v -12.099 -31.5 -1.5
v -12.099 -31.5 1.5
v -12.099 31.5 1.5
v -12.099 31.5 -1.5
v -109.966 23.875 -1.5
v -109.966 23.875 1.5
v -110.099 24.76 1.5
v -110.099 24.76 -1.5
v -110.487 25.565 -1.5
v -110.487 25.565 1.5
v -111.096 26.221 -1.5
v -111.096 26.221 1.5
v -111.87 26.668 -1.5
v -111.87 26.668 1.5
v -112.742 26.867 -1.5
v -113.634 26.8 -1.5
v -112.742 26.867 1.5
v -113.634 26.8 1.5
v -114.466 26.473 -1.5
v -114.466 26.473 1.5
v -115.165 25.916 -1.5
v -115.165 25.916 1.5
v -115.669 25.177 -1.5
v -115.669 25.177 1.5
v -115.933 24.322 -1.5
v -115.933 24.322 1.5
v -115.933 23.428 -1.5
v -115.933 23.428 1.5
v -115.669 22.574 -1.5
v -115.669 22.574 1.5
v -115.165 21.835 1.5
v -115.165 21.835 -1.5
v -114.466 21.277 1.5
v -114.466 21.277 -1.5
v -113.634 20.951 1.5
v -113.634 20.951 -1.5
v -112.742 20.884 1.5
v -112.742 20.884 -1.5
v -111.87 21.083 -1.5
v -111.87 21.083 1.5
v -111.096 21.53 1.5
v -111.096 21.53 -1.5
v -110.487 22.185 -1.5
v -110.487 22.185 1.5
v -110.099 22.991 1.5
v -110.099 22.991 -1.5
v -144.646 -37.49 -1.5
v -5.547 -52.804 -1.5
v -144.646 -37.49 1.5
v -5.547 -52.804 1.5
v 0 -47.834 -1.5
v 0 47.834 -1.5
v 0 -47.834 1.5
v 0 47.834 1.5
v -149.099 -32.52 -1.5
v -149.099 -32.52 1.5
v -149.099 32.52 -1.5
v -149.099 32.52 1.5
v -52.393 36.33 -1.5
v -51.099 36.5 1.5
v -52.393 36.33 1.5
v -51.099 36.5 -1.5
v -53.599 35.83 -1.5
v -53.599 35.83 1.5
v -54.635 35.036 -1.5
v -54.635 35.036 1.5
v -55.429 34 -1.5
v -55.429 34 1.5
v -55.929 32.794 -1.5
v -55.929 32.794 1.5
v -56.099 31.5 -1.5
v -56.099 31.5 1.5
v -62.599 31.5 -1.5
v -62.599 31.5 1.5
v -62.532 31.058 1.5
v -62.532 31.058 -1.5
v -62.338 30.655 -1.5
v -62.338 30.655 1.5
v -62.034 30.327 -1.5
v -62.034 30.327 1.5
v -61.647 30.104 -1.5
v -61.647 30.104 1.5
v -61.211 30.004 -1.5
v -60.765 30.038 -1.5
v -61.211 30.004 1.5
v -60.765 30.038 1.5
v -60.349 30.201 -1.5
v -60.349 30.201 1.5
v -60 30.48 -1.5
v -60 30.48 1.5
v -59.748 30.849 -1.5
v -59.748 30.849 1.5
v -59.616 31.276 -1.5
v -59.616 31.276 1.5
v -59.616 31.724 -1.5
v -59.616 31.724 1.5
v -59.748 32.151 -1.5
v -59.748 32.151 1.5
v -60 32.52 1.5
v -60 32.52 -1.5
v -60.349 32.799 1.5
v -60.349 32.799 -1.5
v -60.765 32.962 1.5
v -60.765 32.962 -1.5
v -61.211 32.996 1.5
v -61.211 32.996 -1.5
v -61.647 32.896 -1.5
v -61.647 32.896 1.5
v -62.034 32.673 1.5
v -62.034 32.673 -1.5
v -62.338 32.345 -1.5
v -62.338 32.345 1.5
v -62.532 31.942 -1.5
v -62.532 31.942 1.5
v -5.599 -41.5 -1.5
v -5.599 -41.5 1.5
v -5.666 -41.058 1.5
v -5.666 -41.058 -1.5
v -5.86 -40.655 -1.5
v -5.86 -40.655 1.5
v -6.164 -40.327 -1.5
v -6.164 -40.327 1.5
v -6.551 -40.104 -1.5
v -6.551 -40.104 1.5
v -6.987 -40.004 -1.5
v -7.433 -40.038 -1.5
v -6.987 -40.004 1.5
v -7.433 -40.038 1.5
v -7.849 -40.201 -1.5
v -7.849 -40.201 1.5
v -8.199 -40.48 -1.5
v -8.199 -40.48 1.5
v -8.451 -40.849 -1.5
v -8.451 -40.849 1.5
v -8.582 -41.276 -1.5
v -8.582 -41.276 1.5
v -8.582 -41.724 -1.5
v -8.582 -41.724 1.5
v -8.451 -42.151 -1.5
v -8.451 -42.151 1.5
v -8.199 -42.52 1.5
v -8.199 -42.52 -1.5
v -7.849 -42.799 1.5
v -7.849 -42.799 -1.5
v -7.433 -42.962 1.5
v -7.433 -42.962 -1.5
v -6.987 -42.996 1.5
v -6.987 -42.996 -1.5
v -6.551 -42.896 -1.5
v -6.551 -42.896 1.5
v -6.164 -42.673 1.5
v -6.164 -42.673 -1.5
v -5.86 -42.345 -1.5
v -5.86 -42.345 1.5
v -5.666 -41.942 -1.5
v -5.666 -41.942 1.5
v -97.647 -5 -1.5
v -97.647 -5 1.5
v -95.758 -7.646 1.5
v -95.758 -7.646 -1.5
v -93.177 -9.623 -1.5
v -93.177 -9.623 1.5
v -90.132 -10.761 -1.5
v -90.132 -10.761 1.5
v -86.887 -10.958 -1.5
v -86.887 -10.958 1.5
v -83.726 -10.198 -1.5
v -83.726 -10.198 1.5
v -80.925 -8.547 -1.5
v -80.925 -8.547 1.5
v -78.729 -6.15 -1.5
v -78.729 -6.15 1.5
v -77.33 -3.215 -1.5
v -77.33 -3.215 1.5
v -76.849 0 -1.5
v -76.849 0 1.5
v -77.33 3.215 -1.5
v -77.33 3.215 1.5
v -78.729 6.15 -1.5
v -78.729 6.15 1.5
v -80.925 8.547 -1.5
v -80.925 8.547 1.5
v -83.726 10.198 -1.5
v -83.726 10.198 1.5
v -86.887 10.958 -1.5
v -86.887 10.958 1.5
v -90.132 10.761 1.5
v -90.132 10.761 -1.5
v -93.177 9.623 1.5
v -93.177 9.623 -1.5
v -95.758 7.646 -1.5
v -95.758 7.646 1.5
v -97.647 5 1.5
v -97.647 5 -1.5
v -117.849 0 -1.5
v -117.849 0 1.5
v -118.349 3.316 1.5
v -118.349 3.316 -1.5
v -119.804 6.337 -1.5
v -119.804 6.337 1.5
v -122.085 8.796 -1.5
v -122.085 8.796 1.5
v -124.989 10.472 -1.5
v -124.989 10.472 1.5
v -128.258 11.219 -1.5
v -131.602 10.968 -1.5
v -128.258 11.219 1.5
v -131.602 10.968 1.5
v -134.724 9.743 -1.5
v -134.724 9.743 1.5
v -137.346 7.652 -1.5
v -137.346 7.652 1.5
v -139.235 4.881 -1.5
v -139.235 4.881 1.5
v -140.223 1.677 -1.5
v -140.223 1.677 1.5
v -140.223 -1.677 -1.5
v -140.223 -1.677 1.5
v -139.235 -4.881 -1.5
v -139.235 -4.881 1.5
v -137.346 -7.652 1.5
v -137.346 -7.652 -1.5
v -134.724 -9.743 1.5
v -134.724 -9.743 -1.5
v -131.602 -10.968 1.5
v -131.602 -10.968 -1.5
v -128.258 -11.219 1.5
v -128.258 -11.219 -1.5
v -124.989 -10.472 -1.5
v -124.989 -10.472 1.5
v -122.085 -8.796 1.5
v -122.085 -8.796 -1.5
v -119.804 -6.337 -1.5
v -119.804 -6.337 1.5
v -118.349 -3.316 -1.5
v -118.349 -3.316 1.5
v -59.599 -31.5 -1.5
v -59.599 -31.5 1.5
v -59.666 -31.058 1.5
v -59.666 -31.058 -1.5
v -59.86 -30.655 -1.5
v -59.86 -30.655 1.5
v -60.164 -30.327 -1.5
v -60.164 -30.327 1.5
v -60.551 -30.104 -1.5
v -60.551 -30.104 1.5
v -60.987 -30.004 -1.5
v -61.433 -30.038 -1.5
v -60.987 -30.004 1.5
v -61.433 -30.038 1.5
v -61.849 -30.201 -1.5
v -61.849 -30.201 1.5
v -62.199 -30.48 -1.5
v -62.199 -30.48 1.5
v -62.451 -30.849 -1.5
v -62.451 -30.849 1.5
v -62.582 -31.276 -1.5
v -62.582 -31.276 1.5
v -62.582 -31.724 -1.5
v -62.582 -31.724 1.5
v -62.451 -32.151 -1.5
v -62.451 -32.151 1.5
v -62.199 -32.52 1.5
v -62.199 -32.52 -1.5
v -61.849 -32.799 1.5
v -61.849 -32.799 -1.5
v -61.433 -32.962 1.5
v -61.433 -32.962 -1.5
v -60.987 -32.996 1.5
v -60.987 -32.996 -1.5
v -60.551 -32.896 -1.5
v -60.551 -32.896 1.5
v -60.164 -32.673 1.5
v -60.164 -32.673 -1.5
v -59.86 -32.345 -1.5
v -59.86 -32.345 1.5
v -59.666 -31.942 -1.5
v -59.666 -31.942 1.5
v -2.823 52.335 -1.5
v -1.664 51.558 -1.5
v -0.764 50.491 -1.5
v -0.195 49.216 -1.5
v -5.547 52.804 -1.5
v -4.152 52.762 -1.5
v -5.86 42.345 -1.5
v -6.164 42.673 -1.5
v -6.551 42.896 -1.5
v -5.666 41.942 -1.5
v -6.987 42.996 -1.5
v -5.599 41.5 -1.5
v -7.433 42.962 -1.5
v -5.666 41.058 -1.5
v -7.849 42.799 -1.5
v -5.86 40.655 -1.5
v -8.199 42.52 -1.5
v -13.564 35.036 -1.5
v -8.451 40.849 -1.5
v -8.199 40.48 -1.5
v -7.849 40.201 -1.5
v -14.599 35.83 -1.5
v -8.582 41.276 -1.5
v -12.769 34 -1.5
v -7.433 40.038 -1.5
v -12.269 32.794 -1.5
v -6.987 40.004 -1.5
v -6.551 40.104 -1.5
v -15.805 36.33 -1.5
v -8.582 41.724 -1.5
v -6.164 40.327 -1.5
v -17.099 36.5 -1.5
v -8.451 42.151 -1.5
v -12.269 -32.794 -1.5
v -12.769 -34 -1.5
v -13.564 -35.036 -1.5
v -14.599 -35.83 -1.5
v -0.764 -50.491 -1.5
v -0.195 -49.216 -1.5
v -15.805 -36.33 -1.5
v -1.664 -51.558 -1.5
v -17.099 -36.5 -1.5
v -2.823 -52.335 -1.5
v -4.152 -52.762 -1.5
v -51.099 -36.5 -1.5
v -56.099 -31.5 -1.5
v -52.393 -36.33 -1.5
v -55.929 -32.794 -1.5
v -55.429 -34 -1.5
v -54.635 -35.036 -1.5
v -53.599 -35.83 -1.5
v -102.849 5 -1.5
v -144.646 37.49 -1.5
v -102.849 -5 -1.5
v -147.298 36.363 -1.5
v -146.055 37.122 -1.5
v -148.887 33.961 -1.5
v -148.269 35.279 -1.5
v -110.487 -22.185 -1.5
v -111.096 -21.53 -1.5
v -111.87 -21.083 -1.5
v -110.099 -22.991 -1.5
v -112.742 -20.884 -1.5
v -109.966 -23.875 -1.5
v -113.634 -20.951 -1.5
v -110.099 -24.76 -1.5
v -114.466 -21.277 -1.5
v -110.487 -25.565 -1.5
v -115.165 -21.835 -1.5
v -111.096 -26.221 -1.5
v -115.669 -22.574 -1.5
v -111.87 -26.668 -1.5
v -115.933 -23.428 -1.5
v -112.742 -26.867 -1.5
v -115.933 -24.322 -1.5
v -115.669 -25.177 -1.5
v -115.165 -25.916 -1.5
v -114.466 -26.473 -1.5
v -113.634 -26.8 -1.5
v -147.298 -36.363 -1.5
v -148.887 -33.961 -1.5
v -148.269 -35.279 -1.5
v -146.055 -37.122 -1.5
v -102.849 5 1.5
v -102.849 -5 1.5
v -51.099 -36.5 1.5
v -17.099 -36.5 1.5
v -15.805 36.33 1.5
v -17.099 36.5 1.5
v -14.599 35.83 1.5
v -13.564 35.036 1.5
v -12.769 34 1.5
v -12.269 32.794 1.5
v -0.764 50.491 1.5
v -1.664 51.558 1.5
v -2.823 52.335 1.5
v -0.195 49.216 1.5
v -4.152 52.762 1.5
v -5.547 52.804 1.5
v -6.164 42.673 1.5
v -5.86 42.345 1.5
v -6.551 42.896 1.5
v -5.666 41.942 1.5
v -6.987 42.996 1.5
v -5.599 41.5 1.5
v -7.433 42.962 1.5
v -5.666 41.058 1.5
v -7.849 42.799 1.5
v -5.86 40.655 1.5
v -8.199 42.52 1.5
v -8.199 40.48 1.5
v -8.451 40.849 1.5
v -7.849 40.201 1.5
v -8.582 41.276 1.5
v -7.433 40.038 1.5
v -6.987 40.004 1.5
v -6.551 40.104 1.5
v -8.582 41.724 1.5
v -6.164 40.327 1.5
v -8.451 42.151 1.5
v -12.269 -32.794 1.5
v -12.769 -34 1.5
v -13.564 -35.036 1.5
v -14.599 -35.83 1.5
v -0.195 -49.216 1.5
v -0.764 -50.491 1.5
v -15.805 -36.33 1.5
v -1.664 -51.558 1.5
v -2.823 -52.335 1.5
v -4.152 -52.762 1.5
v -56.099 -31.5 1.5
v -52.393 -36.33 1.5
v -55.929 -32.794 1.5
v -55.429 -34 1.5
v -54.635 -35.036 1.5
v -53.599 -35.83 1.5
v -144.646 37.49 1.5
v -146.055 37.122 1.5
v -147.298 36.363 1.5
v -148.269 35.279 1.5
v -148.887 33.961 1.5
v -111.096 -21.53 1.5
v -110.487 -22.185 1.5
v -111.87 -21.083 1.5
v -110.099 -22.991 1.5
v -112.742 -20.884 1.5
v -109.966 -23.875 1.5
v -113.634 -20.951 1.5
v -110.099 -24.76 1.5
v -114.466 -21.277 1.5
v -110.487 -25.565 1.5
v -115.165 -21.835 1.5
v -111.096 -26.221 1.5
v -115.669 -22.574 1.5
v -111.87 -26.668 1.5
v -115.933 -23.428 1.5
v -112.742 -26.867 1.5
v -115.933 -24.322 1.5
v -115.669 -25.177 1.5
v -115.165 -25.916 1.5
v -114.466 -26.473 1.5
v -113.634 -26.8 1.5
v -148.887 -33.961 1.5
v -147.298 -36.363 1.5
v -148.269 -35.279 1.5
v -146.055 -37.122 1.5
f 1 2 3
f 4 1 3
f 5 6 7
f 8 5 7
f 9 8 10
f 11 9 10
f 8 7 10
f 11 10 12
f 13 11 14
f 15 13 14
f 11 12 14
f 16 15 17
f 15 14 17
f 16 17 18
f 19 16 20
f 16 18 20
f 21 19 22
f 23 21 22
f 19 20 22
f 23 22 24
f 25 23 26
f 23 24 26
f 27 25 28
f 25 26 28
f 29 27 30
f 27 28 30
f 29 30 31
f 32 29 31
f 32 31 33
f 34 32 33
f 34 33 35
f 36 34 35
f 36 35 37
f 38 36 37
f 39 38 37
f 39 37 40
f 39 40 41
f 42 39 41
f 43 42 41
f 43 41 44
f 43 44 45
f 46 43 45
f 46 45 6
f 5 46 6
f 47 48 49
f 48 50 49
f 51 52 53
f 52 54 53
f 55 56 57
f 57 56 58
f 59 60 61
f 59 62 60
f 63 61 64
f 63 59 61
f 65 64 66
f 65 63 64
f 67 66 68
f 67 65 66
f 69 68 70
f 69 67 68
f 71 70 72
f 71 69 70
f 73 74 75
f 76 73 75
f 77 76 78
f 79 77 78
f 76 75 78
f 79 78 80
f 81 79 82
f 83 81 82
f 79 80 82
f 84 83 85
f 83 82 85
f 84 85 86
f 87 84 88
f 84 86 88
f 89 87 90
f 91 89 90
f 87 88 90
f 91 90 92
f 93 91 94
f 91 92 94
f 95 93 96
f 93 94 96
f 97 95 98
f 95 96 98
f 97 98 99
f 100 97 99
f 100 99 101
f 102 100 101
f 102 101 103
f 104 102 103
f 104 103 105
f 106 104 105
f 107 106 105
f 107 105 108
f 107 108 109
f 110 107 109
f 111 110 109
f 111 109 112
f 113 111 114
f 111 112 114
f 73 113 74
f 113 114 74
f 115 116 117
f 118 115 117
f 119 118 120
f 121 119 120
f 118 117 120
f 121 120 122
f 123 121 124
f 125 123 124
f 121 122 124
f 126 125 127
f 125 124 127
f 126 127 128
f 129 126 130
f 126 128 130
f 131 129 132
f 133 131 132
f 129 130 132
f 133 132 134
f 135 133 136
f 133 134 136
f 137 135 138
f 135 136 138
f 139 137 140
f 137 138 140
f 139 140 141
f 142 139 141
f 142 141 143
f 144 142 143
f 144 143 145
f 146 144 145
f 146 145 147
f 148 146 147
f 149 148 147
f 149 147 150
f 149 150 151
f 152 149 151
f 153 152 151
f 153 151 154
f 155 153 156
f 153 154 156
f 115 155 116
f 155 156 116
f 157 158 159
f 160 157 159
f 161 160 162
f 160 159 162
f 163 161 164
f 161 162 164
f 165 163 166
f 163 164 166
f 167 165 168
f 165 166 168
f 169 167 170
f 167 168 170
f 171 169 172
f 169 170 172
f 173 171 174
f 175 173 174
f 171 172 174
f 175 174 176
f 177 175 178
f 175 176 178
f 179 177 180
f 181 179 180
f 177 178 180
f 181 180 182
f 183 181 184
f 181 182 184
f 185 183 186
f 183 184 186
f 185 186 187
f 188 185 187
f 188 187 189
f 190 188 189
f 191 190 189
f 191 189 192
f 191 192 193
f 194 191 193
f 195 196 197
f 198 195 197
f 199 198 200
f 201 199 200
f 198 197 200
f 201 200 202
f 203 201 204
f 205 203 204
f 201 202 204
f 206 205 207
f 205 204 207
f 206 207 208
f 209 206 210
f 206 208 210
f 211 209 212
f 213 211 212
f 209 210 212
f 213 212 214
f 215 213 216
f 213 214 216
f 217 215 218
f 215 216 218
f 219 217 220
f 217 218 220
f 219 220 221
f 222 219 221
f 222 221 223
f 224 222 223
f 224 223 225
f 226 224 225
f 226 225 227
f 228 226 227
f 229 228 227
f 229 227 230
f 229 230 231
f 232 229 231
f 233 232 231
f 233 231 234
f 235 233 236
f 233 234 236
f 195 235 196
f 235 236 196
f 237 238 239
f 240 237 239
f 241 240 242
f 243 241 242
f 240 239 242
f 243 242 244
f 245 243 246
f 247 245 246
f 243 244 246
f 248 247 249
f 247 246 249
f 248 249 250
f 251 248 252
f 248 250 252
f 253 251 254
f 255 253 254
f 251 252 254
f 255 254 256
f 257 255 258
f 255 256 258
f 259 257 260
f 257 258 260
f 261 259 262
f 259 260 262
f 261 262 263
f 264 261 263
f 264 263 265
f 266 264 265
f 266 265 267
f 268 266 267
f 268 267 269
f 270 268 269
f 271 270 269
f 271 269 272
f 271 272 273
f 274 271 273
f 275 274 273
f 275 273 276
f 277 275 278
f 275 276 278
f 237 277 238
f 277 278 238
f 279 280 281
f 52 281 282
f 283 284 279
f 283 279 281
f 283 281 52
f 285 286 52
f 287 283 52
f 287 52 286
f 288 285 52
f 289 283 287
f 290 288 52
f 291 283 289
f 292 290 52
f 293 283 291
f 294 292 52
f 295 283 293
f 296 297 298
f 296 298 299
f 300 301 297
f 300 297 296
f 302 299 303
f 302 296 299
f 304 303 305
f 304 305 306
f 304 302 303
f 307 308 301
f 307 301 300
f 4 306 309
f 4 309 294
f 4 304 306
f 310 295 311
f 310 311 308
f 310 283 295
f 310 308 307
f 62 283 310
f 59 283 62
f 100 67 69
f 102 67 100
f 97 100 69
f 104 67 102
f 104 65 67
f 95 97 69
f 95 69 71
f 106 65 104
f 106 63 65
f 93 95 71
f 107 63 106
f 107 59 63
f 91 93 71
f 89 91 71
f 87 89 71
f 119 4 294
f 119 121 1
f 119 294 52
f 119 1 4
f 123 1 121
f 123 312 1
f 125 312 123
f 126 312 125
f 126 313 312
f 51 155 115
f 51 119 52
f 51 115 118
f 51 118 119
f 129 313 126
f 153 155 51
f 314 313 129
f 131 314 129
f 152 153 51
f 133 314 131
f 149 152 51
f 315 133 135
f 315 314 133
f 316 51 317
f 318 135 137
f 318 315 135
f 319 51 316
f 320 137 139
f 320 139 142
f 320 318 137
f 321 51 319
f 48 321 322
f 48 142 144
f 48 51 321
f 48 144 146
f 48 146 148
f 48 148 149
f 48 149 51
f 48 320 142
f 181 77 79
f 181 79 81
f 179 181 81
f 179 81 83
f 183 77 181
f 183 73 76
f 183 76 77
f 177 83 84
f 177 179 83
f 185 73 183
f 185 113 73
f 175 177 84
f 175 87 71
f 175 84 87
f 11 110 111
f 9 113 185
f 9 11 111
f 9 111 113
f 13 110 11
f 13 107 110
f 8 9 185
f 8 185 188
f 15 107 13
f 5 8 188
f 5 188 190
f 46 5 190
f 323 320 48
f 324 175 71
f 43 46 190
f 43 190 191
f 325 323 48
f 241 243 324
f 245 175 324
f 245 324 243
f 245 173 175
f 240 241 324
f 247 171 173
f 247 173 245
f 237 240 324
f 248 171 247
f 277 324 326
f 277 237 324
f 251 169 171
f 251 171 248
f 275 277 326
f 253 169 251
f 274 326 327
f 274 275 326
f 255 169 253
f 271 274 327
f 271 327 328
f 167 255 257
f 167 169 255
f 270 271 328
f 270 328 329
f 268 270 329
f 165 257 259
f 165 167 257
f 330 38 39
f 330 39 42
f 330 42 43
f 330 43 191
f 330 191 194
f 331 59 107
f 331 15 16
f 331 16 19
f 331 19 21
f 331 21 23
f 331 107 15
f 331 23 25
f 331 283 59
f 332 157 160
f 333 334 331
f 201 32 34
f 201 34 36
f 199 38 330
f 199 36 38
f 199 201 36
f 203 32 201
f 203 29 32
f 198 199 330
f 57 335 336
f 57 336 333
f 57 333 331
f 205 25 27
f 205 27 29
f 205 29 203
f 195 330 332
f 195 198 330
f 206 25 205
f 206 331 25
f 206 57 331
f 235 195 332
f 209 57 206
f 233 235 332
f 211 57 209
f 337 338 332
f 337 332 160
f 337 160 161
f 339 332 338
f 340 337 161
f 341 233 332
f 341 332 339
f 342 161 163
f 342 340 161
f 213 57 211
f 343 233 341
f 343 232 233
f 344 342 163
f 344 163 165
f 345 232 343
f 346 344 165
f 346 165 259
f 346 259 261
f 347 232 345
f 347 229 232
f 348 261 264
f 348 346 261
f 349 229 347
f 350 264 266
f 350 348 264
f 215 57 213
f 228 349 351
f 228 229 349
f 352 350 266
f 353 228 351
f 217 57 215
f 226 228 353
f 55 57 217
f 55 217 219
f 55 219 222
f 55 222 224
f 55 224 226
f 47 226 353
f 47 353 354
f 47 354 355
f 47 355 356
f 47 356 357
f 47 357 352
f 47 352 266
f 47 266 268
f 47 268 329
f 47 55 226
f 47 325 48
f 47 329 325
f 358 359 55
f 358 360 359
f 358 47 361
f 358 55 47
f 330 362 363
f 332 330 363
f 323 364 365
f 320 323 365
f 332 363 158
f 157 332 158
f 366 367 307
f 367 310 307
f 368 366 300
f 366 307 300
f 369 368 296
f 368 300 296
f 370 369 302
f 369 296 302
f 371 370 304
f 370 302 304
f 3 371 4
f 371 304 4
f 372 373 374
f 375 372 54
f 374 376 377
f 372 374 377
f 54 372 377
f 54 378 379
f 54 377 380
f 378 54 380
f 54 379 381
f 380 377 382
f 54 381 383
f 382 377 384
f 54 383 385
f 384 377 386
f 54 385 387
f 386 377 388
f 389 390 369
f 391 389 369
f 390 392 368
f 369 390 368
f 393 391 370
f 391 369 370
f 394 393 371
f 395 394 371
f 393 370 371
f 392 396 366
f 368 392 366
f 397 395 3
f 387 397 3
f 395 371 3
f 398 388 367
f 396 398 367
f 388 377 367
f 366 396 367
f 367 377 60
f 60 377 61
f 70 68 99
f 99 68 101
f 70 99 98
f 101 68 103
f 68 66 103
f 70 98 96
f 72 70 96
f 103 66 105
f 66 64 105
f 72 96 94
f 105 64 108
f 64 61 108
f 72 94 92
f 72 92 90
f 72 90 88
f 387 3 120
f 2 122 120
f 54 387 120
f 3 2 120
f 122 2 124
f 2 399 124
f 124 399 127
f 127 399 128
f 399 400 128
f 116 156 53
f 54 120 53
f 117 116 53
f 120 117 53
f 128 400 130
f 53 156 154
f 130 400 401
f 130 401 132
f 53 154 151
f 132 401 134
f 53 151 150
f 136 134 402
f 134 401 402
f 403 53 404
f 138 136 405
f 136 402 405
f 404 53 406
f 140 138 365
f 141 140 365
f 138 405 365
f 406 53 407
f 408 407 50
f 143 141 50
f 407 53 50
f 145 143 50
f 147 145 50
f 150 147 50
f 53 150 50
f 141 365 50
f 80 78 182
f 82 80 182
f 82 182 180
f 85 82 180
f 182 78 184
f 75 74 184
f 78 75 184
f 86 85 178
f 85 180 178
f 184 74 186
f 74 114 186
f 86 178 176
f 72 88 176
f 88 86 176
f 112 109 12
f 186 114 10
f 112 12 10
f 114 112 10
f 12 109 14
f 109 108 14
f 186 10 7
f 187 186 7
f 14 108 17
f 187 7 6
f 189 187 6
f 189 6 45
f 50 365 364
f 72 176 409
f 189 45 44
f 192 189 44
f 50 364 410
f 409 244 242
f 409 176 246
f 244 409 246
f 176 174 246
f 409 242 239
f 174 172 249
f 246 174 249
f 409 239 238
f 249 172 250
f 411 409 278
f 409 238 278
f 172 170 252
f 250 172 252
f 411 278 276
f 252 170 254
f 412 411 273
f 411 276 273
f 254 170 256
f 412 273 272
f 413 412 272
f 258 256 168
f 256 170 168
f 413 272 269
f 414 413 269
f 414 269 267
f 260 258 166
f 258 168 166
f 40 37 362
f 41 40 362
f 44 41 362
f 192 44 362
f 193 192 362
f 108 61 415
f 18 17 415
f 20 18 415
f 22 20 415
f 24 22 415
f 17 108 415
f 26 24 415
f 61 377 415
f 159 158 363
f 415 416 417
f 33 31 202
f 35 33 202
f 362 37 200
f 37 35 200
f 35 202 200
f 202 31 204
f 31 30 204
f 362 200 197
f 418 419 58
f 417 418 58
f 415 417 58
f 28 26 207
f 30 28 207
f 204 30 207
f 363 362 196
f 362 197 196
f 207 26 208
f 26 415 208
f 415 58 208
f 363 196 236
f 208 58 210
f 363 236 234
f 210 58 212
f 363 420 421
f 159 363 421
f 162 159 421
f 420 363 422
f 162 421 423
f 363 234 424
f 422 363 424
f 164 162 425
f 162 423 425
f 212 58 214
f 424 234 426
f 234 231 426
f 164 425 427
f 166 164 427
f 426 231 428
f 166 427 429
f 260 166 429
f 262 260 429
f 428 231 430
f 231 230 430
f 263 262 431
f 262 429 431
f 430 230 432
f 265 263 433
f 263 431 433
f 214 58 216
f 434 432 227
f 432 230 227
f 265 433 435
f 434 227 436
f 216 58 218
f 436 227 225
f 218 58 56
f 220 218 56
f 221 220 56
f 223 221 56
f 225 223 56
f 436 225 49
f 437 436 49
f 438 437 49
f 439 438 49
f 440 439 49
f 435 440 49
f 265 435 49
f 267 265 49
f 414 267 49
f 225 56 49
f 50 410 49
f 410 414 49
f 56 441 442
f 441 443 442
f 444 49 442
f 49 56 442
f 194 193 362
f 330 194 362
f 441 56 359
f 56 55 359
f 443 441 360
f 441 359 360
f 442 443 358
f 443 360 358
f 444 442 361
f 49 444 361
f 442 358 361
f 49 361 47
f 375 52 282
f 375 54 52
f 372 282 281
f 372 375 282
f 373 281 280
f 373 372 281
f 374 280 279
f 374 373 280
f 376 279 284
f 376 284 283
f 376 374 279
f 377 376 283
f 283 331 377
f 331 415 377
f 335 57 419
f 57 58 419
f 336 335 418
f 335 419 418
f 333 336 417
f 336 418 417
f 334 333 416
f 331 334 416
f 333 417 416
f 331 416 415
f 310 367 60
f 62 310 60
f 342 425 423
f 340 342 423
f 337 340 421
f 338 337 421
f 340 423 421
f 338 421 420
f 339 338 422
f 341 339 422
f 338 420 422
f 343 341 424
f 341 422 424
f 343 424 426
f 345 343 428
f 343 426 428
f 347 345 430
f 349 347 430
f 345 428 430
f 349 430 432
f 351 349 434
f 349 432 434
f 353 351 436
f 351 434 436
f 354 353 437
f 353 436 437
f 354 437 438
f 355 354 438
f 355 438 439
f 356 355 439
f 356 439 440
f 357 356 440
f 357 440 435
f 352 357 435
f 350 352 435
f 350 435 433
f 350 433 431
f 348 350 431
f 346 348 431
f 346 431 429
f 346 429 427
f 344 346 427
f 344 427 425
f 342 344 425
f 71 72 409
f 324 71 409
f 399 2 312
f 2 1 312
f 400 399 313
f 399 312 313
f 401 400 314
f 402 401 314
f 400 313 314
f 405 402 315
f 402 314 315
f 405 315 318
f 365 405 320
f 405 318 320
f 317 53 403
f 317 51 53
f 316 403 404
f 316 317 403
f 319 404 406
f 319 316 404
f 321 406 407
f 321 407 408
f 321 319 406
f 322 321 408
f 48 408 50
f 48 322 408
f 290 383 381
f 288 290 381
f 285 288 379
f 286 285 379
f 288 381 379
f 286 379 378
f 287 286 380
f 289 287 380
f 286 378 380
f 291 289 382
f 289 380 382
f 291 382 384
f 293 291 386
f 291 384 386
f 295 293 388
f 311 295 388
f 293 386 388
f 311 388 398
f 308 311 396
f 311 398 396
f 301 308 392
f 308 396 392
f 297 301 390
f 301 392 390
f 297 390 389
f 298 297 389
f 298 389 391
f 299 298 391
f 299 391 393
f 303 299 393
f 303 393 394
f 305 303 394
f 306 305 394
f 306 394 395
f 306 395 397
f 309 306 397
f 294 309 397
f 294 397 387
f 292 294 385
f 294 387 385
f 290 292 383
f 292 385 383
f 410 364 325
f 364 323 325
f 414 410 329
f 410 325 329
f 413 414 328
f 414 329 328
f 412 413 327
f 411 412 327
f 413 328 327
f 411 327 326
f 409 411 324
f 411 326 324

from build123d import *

# Parameters (mm, degrees)
BOSS_EXTRUDE1_DEPTH = 1.5
FILLET1_R           = 5
SKETCH2_R           = 11.25
SKETCH2_R_2         = 1.5
CUT_EXTRUDE1_DEPTH  = 3
FILLET2_R           = 5
CUT_EXTRUDE2_REACH  = 160.212
SKETCH3_R           = 3


with BuildPart() as part:
    # Sketch1 → Boss-Extrude1 (new, symmetric)
    with BuildSketch(Plane(origin=(0, 0, 0), x_dir=(0, 1, 0), z_dir=(0, 0, 1))):
        Polygon((53.415, 0), (-53.415, 0), (-37, 149.099120638), (37, 149.099120638), align=None)
    extrude(amount=BOSS_EXTRUDE1_DEPTH, both=True)

    # Fillet1
    fillet1_edges = [part.edges().sort_by_distance(p)[0] for p in [
        (-149.099120638, -37, 0),
        (-149.099120638, 37, 0),
        (0, 53.415, 0),
        (0, -53.415, 0),
    ]]
    fillet(fillet1_edges, radius=FILLET1_R)

    # Sketch2 → Cut-Extrude1 (cut)
    with BuildSketch(Plane.XY.offset(1.5)):
        with Locations((-129.099120638, 0)):
            Circle(SKETCH2_R)
        Polygon((-56.099120638, 36.5), (-56.099120638, 0), (-56.099120638, -36.5), (-12.099120638, -36.5), (-12.099120638, 36.5), align=None)
        with BuildLine():
            Line((-102.849120638, 5), (-102.849120638, -5))
            Line((-102.849120638, -5), (-97.647079609, -5))
            ThreePointArc((-97.647079609, -5), (-76.849120638, 0), (-97.647079609, 5))
            Line((-97.647079609, 5), (-102.849120638, 5))
        make_face()
        with Locations((-7.099120638, 41.5)):
            Circle(SKETCH2_R_2)
        with Locations((-7.099120638, -41.5)):
            Circle(SKETCH2_R_2)
        with Locations((-61.099120638, -31.5)):
            Circle(SKETCH2_R_2)
        with Locations(Location((-61.099120638, 31.5, 0), (0, 0, 180))):
            Circle(SKETCH2_R_2)
    extrude(amount=-CUT_EXTRUDE1_DEPTH, mode=Mode.SUBTRACT)

    # Fillet2
    fillet2_edges = [part.edges().sort_by_distance(p)[0] for p in [
        (-56.099120638, -36.5, 0),
        (-56.099120638, 36.5, 0),
        (-12.099120638, 36.5, 0),
        (-12.099120638, -36.5, 0),
    ]]
    fillet(fillet2_edges, radius=FILLET2_R)

    # Sketch3 → Cut-Extrude2 (cut, up to next)
    with BuildSketch(Plane.XY.offset(1.5), mode=Mode.PRIVATE) as cut_extrude2_sk1:
        with Locations((-112.96609651, -23.875332325)):
            Circle(SKETCH3_R)
    cut_extrude2_tool1 = extrude(cut_extrude2_sk1.sketch, amount=-CUT_EXTRUDE2_REACH, mode=Mode.PRIVATE) & part.part
    # Sketch3 → Cut-Extrude2 (cut, up to next)
    with BuildSketch(Plane.XY.offset(1.5), mode=Mode.PRIVATE) as cut_extrude2_sk2:
        with Locations((-112.96609651, 23.875332325)):
            Circle(SKETCH3_R)
    cut_extrude2_tool2 = extrude(cut_extrude2_sk2.sketch, amount=-CUT_EXTRUDE2_REACH, mode=Mode.PRIVATE) & part.part
    add(cut_extrude2_tool1.solids().sort_by_distance((-112.966097, -23.875332, 1.5))[0], mode=Mode.SUBTRACT)
    add(cut_extrude2_tool2.solids().sort_by_distance((-112.966097, 23.875332, 1.5))[0], mode=Mode.SUBTRACT)


solid = part.part
